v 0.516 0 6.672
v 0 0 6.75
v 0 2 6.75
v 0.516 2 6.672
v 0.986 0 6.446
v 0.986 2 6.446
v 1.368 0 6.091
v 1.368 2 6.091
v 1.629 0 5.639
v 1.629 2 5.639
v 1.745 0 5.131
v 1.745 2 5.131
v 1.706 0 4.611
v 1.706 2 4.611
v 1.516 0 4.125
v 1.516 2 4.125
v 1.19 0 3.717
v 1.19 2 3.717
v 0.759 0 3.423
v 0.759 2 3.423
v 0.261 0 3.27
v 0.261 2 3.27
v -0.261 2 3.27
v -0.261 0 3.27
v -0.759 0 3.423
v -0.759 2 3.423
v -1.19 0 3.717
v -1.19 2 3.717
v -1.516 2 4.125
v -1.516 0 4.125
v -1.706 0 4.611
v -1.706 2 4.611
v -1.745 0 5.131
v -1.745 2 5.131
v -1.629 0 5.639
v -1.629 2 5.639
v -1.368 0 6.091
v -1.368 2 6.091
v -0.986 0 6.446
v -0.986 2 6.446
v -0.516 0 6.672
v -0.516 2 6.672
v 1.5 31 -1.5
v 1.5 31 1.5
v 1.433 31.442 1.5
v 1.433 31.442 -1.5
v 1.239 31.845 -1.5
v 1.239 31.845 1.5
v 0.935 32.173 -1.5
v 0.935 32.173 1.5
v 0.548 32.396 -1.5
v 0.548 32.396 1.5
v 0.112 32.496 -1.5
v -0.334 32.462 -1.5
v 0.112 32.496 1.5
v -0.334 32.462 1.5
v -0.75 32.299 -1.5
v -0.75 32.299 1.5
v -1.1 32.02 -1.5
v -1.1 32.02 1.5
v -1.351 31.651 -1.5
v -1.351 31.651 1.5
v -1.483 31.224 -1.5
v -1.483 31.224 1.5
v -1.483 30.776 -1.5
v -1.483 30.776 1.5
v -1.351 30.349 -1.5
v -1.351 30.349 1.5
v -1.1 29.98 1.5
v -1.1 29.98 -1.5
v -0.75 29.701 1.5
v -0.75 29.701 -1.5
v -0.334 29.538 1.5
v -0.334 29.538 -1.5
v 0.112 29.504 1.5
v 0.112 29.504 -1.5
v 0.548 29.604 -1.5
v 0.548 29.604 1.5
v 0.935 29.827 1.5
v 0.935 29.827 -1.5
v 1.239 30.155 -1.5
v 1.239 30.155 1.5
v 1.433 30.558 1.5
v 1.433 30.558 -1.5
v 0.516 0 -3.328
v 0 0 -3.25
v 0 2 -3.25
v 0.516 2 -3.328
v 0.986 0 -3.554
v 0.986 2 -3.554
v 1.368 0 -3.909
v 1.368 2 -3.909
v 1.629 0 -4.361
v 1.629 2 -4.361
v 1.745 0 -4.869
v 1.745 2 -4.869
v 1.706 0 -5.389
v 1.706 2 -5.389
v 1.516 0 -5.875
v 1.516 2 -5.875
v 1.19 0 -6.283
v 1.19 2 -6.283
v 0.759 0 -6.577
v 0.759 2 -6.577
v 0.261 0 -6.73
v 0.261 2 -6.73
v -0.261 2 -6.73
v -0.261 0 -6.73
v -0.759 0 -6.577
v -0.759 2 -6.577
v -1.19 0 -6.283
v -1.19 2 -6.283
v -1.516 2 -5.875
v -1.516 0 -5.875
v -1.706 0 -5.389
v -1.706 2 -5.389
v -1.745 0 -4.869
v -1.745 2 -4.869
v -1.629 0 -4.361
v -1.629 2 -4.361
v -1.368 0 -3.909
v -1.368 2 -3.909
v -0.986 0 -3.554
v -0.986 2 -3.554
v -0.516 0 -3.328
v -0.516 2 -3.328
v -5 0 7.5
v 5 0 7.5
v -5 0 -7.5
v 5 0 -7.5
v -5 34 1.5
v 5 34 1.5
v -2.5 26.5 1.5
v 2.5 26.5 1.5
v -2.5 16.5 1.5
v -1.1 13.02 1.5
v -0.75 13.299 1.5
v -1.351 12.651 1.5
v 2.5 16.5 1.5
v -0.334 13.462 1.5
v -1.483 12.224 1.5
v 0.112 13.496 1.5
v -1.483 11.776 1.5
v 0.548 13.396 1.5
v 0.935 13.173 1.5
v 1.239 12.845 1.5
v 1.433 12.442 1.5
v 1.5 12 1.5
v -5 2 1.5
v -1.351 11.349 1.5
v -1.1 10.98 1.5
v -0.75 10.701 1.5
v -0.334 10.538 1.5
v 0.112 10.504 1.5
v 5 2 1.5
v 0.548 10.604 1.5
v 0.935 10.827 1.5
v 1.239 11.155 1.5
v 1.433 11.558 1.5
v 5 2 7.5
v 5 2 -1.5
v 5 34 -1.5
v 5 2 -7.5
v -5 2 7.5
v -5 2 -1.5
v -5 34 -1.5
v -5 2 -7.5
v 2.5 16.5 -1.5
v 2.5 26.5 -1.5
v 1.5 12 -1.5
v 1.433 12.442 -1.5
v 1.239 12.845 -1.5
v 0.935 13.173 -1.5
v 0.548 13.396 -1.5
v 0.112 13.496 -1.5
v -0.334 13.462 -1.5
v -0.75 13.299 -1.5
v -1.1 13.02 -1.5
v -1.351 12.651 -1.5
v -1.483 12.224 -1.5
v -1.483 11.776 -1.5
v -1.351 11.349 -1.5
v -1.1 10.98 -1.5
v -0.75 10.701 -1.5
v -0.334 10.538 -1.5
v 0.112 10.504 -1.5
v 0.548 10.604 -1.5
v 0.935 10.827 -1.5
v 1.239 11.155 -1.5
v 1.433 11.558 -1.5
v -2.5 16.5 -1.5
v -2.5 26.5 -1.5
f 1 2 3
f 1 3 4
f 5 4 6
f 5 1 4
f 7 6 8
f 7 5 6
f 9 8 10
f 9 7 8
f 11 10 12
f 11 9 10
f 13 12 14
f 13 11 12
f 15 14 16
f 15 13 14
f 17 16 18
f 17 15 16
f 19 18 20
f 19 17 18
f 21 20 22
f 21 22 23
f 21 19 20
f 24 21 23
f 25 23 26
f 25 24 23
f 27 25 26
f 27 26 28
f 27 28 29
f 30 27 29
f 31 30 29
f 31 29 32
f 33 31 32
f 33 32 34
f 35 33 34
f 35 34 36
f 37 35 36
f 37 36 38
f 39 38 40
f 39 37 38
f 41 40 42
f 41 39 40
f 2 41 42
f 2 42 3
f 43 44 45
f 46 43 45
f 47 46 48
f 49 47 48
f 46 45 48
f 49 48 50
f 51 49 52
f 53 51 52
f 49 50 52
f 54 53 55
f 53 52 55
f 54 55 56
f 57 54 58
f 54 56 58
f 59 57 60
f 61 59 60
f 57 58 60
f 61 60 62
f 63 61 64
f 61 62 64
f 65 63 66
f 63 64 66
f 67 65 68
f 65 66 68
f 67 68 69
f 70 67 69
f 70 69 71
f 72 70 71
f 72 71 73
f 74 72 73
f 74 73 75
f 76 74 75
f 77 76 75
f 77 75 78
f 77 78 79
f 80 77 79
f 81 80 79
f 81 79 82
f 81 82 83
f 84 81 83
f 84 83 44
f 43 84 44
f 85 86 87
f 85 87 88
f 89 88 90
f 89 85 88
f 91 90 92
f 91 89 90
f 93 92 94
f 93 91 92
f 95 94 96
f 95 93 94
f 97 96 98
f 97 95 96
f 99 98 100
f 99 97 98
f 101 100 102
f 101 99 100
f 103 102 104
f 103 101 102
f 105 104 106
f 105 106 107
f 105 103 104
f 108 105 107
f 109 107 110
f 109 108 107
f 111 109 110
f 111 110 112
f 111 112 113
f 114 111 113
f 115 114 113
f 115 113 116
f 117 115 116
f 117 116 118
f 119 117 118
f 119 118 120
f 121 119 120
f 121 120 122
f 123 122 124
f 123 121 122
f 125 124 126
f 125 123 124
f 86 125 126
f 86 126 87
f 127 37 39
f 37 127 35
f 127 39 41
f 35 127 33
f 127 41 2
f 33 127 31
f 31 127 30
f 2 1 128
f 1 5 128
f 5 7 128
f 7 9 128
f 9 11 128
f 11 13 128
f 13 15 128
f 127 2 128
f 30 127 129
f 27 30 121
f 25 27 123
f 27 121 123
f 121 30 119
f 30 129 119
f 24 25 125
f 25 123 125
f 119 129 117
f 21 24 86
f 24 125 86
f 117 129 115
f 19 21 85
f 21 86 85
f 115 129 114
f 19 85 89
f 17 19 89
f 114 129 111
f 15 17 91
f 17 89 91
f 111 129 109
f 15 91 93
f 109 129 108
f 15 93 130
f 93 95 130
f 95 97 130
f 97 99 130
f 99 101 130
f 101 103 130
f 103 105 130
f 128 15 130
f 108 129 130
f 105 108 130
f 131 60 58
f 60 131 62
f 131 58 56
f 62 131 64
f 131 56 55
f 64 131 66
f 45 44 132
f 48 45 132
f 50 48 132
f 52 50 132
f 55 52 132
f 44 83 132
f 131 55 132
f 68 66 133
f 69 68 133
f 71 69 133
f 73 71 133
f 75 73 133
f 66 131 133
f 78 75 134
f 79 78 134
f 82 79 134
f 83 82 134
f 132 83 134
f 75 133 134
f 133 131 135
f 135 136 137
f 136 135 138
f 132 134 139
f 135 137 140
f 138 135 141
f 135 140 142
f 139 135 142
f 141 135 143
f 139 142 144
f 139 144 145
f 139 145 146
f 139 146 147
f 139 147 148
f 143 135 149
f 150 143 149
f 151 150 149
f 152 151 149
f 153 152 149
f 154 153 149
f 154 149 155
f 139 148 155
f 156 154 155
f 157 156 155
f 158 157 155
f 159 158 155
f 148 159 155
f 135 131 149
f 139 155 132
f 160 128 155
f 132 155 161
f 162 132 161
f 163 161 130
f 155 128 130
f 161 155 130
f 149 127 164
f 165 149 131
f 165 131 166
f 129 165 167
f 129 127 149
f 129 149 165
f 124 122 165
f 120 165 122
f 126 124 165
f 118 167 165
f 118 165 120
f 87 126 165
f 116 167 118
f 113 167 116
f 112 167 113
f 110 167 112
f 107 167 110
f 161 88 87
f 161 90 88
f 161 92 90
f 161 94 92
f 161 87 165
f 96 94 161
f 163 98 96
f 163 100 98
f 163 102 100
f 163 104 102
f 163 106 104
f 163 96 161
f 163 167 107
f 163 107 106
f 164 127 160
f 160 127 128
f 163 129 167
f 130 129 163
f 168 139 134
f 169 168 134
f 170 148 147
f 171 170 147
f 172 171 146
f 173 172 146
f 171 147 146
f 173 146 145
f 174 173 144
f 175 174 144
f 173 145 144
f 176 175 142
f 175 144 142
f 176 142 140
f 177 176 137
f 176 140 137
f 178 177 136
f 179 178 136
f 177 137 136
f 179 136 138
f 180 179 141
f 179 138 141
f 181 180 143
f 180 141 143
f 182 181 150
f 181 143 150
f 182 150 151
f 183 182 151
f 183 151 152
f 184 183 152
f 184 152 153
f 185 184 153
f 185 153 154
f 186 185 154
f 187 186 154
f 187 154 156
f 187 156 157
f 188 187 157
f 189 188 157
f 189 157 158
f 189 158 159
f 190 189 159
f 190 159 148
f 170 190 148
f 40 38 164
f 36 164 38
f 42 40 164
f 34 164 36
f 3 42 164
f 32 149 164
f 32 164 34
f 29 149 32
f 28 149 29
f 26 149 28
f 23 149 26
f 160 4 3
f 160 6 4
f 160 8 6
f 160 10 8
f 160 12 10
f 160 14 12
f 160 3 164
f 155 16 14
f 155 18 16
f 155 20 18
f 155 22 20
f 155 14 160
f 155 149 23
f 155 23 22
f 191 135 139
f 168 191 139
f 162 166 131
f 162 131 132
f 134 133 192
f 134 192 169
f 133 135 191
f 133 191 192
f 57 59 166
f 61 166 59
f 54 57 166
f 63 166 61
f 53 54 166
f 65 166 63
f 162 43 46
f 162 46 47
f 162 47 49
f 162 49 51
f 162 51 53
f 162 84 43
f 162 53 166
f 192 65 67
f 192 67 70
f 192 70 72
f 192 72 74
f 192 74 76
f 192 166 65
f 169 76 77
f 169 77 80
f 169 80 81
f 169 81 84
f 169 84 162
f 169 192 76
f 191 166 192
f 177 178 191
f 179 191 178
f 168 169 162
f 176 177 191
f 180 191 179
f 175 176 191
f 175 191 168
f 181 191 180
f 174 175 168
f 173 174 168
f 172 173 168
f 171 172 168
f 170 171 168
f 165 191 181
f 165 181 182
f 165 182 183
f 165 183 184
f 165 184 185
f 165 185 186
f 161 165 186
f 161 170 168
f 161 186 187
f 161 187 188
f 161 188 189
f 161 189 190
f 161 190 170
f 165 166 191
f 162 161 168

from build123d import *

# Parameters (mm, degrees)
CROQUIS1_W              = 10
CROQUIS1_H              = 15
CROQUIS1_R              = 1.75
SALIENTE_EXTRUIR1_DEPTH = 2
CROQUIS2_W              = 10
CROQUIS2_H              = 3
SALIENTE_EXTRUIR2_DEPTH = 32
CROQUIS3_R              = 1.5
CORTAR_EXTRUIR1_DEPTH   = 36.524639337
CROQUIS4_W              = 5
CROQUIS4_H              = 10
CORTAR_EXTRUIR2_DEPTH   = 36.524639337


with BuildPart() as part:
    # Croquis1 → Saliente-Extruir1 (new body)
    with BuildSketch(Plane(origin=(0, 0, 0), x_dir=(1, 0, 0), z_dir=(0, 1, 0))):
        Rectangle(CROQUIS1_W, CROQUIS1_H)
        with Locations(Location((0, 5, 0), (0, 0, 270))):
            Circle(CROQUIS1_R, mode=Mode.SUBTRACT)
        with Locations(Location((0, -5, 0), (0, 0, 270))):
            Circle(CROQUIS1_R, mode=Mode.SUBTRACT)
    extrude(amount=SALIENTE_EXTRUIR1_DEPTH)

    # Croquis2 → Saliente-Extruir2 (add)
    with BuildSketch(Plane(origin=(0, 2, 0), x_dir=(1, 0, 0), z_dir=(0, 1, 0))):
        Rectangle(CROQUIS2_W, CROQUIS2_H)
    extrude(amount=SALIENTE_EXTRUIR2_DEPTH)

    # Croquis3 → Cortar-Extruir1 (cut, through all)
    with BuildSketch(Plane.XY.offset(1.5)):
        with Locations((0, 31)):
            Circle(CROQUIS3_R)
        with Locations((0, 12)):
            Circle(CROQUIS3_R)
    extrude(amount=-CORTAR_EXTRUIR1_DEPTH, mode=Mode.SUBTRACT)

    # Croquis4 → Cortar-Extruir2 (cut, through all)
    with BuildSketch(Plane.XY.offset(1.5)):
        with Locations((0, 21.5)):
            Rectangle(CROQUIS4_W, CROQUIS4_H)
    extrude(amount=-CORTAR_EXTRUIR2_DEPTH, mode=Mode.SUBTRACT)


solid = part.part
